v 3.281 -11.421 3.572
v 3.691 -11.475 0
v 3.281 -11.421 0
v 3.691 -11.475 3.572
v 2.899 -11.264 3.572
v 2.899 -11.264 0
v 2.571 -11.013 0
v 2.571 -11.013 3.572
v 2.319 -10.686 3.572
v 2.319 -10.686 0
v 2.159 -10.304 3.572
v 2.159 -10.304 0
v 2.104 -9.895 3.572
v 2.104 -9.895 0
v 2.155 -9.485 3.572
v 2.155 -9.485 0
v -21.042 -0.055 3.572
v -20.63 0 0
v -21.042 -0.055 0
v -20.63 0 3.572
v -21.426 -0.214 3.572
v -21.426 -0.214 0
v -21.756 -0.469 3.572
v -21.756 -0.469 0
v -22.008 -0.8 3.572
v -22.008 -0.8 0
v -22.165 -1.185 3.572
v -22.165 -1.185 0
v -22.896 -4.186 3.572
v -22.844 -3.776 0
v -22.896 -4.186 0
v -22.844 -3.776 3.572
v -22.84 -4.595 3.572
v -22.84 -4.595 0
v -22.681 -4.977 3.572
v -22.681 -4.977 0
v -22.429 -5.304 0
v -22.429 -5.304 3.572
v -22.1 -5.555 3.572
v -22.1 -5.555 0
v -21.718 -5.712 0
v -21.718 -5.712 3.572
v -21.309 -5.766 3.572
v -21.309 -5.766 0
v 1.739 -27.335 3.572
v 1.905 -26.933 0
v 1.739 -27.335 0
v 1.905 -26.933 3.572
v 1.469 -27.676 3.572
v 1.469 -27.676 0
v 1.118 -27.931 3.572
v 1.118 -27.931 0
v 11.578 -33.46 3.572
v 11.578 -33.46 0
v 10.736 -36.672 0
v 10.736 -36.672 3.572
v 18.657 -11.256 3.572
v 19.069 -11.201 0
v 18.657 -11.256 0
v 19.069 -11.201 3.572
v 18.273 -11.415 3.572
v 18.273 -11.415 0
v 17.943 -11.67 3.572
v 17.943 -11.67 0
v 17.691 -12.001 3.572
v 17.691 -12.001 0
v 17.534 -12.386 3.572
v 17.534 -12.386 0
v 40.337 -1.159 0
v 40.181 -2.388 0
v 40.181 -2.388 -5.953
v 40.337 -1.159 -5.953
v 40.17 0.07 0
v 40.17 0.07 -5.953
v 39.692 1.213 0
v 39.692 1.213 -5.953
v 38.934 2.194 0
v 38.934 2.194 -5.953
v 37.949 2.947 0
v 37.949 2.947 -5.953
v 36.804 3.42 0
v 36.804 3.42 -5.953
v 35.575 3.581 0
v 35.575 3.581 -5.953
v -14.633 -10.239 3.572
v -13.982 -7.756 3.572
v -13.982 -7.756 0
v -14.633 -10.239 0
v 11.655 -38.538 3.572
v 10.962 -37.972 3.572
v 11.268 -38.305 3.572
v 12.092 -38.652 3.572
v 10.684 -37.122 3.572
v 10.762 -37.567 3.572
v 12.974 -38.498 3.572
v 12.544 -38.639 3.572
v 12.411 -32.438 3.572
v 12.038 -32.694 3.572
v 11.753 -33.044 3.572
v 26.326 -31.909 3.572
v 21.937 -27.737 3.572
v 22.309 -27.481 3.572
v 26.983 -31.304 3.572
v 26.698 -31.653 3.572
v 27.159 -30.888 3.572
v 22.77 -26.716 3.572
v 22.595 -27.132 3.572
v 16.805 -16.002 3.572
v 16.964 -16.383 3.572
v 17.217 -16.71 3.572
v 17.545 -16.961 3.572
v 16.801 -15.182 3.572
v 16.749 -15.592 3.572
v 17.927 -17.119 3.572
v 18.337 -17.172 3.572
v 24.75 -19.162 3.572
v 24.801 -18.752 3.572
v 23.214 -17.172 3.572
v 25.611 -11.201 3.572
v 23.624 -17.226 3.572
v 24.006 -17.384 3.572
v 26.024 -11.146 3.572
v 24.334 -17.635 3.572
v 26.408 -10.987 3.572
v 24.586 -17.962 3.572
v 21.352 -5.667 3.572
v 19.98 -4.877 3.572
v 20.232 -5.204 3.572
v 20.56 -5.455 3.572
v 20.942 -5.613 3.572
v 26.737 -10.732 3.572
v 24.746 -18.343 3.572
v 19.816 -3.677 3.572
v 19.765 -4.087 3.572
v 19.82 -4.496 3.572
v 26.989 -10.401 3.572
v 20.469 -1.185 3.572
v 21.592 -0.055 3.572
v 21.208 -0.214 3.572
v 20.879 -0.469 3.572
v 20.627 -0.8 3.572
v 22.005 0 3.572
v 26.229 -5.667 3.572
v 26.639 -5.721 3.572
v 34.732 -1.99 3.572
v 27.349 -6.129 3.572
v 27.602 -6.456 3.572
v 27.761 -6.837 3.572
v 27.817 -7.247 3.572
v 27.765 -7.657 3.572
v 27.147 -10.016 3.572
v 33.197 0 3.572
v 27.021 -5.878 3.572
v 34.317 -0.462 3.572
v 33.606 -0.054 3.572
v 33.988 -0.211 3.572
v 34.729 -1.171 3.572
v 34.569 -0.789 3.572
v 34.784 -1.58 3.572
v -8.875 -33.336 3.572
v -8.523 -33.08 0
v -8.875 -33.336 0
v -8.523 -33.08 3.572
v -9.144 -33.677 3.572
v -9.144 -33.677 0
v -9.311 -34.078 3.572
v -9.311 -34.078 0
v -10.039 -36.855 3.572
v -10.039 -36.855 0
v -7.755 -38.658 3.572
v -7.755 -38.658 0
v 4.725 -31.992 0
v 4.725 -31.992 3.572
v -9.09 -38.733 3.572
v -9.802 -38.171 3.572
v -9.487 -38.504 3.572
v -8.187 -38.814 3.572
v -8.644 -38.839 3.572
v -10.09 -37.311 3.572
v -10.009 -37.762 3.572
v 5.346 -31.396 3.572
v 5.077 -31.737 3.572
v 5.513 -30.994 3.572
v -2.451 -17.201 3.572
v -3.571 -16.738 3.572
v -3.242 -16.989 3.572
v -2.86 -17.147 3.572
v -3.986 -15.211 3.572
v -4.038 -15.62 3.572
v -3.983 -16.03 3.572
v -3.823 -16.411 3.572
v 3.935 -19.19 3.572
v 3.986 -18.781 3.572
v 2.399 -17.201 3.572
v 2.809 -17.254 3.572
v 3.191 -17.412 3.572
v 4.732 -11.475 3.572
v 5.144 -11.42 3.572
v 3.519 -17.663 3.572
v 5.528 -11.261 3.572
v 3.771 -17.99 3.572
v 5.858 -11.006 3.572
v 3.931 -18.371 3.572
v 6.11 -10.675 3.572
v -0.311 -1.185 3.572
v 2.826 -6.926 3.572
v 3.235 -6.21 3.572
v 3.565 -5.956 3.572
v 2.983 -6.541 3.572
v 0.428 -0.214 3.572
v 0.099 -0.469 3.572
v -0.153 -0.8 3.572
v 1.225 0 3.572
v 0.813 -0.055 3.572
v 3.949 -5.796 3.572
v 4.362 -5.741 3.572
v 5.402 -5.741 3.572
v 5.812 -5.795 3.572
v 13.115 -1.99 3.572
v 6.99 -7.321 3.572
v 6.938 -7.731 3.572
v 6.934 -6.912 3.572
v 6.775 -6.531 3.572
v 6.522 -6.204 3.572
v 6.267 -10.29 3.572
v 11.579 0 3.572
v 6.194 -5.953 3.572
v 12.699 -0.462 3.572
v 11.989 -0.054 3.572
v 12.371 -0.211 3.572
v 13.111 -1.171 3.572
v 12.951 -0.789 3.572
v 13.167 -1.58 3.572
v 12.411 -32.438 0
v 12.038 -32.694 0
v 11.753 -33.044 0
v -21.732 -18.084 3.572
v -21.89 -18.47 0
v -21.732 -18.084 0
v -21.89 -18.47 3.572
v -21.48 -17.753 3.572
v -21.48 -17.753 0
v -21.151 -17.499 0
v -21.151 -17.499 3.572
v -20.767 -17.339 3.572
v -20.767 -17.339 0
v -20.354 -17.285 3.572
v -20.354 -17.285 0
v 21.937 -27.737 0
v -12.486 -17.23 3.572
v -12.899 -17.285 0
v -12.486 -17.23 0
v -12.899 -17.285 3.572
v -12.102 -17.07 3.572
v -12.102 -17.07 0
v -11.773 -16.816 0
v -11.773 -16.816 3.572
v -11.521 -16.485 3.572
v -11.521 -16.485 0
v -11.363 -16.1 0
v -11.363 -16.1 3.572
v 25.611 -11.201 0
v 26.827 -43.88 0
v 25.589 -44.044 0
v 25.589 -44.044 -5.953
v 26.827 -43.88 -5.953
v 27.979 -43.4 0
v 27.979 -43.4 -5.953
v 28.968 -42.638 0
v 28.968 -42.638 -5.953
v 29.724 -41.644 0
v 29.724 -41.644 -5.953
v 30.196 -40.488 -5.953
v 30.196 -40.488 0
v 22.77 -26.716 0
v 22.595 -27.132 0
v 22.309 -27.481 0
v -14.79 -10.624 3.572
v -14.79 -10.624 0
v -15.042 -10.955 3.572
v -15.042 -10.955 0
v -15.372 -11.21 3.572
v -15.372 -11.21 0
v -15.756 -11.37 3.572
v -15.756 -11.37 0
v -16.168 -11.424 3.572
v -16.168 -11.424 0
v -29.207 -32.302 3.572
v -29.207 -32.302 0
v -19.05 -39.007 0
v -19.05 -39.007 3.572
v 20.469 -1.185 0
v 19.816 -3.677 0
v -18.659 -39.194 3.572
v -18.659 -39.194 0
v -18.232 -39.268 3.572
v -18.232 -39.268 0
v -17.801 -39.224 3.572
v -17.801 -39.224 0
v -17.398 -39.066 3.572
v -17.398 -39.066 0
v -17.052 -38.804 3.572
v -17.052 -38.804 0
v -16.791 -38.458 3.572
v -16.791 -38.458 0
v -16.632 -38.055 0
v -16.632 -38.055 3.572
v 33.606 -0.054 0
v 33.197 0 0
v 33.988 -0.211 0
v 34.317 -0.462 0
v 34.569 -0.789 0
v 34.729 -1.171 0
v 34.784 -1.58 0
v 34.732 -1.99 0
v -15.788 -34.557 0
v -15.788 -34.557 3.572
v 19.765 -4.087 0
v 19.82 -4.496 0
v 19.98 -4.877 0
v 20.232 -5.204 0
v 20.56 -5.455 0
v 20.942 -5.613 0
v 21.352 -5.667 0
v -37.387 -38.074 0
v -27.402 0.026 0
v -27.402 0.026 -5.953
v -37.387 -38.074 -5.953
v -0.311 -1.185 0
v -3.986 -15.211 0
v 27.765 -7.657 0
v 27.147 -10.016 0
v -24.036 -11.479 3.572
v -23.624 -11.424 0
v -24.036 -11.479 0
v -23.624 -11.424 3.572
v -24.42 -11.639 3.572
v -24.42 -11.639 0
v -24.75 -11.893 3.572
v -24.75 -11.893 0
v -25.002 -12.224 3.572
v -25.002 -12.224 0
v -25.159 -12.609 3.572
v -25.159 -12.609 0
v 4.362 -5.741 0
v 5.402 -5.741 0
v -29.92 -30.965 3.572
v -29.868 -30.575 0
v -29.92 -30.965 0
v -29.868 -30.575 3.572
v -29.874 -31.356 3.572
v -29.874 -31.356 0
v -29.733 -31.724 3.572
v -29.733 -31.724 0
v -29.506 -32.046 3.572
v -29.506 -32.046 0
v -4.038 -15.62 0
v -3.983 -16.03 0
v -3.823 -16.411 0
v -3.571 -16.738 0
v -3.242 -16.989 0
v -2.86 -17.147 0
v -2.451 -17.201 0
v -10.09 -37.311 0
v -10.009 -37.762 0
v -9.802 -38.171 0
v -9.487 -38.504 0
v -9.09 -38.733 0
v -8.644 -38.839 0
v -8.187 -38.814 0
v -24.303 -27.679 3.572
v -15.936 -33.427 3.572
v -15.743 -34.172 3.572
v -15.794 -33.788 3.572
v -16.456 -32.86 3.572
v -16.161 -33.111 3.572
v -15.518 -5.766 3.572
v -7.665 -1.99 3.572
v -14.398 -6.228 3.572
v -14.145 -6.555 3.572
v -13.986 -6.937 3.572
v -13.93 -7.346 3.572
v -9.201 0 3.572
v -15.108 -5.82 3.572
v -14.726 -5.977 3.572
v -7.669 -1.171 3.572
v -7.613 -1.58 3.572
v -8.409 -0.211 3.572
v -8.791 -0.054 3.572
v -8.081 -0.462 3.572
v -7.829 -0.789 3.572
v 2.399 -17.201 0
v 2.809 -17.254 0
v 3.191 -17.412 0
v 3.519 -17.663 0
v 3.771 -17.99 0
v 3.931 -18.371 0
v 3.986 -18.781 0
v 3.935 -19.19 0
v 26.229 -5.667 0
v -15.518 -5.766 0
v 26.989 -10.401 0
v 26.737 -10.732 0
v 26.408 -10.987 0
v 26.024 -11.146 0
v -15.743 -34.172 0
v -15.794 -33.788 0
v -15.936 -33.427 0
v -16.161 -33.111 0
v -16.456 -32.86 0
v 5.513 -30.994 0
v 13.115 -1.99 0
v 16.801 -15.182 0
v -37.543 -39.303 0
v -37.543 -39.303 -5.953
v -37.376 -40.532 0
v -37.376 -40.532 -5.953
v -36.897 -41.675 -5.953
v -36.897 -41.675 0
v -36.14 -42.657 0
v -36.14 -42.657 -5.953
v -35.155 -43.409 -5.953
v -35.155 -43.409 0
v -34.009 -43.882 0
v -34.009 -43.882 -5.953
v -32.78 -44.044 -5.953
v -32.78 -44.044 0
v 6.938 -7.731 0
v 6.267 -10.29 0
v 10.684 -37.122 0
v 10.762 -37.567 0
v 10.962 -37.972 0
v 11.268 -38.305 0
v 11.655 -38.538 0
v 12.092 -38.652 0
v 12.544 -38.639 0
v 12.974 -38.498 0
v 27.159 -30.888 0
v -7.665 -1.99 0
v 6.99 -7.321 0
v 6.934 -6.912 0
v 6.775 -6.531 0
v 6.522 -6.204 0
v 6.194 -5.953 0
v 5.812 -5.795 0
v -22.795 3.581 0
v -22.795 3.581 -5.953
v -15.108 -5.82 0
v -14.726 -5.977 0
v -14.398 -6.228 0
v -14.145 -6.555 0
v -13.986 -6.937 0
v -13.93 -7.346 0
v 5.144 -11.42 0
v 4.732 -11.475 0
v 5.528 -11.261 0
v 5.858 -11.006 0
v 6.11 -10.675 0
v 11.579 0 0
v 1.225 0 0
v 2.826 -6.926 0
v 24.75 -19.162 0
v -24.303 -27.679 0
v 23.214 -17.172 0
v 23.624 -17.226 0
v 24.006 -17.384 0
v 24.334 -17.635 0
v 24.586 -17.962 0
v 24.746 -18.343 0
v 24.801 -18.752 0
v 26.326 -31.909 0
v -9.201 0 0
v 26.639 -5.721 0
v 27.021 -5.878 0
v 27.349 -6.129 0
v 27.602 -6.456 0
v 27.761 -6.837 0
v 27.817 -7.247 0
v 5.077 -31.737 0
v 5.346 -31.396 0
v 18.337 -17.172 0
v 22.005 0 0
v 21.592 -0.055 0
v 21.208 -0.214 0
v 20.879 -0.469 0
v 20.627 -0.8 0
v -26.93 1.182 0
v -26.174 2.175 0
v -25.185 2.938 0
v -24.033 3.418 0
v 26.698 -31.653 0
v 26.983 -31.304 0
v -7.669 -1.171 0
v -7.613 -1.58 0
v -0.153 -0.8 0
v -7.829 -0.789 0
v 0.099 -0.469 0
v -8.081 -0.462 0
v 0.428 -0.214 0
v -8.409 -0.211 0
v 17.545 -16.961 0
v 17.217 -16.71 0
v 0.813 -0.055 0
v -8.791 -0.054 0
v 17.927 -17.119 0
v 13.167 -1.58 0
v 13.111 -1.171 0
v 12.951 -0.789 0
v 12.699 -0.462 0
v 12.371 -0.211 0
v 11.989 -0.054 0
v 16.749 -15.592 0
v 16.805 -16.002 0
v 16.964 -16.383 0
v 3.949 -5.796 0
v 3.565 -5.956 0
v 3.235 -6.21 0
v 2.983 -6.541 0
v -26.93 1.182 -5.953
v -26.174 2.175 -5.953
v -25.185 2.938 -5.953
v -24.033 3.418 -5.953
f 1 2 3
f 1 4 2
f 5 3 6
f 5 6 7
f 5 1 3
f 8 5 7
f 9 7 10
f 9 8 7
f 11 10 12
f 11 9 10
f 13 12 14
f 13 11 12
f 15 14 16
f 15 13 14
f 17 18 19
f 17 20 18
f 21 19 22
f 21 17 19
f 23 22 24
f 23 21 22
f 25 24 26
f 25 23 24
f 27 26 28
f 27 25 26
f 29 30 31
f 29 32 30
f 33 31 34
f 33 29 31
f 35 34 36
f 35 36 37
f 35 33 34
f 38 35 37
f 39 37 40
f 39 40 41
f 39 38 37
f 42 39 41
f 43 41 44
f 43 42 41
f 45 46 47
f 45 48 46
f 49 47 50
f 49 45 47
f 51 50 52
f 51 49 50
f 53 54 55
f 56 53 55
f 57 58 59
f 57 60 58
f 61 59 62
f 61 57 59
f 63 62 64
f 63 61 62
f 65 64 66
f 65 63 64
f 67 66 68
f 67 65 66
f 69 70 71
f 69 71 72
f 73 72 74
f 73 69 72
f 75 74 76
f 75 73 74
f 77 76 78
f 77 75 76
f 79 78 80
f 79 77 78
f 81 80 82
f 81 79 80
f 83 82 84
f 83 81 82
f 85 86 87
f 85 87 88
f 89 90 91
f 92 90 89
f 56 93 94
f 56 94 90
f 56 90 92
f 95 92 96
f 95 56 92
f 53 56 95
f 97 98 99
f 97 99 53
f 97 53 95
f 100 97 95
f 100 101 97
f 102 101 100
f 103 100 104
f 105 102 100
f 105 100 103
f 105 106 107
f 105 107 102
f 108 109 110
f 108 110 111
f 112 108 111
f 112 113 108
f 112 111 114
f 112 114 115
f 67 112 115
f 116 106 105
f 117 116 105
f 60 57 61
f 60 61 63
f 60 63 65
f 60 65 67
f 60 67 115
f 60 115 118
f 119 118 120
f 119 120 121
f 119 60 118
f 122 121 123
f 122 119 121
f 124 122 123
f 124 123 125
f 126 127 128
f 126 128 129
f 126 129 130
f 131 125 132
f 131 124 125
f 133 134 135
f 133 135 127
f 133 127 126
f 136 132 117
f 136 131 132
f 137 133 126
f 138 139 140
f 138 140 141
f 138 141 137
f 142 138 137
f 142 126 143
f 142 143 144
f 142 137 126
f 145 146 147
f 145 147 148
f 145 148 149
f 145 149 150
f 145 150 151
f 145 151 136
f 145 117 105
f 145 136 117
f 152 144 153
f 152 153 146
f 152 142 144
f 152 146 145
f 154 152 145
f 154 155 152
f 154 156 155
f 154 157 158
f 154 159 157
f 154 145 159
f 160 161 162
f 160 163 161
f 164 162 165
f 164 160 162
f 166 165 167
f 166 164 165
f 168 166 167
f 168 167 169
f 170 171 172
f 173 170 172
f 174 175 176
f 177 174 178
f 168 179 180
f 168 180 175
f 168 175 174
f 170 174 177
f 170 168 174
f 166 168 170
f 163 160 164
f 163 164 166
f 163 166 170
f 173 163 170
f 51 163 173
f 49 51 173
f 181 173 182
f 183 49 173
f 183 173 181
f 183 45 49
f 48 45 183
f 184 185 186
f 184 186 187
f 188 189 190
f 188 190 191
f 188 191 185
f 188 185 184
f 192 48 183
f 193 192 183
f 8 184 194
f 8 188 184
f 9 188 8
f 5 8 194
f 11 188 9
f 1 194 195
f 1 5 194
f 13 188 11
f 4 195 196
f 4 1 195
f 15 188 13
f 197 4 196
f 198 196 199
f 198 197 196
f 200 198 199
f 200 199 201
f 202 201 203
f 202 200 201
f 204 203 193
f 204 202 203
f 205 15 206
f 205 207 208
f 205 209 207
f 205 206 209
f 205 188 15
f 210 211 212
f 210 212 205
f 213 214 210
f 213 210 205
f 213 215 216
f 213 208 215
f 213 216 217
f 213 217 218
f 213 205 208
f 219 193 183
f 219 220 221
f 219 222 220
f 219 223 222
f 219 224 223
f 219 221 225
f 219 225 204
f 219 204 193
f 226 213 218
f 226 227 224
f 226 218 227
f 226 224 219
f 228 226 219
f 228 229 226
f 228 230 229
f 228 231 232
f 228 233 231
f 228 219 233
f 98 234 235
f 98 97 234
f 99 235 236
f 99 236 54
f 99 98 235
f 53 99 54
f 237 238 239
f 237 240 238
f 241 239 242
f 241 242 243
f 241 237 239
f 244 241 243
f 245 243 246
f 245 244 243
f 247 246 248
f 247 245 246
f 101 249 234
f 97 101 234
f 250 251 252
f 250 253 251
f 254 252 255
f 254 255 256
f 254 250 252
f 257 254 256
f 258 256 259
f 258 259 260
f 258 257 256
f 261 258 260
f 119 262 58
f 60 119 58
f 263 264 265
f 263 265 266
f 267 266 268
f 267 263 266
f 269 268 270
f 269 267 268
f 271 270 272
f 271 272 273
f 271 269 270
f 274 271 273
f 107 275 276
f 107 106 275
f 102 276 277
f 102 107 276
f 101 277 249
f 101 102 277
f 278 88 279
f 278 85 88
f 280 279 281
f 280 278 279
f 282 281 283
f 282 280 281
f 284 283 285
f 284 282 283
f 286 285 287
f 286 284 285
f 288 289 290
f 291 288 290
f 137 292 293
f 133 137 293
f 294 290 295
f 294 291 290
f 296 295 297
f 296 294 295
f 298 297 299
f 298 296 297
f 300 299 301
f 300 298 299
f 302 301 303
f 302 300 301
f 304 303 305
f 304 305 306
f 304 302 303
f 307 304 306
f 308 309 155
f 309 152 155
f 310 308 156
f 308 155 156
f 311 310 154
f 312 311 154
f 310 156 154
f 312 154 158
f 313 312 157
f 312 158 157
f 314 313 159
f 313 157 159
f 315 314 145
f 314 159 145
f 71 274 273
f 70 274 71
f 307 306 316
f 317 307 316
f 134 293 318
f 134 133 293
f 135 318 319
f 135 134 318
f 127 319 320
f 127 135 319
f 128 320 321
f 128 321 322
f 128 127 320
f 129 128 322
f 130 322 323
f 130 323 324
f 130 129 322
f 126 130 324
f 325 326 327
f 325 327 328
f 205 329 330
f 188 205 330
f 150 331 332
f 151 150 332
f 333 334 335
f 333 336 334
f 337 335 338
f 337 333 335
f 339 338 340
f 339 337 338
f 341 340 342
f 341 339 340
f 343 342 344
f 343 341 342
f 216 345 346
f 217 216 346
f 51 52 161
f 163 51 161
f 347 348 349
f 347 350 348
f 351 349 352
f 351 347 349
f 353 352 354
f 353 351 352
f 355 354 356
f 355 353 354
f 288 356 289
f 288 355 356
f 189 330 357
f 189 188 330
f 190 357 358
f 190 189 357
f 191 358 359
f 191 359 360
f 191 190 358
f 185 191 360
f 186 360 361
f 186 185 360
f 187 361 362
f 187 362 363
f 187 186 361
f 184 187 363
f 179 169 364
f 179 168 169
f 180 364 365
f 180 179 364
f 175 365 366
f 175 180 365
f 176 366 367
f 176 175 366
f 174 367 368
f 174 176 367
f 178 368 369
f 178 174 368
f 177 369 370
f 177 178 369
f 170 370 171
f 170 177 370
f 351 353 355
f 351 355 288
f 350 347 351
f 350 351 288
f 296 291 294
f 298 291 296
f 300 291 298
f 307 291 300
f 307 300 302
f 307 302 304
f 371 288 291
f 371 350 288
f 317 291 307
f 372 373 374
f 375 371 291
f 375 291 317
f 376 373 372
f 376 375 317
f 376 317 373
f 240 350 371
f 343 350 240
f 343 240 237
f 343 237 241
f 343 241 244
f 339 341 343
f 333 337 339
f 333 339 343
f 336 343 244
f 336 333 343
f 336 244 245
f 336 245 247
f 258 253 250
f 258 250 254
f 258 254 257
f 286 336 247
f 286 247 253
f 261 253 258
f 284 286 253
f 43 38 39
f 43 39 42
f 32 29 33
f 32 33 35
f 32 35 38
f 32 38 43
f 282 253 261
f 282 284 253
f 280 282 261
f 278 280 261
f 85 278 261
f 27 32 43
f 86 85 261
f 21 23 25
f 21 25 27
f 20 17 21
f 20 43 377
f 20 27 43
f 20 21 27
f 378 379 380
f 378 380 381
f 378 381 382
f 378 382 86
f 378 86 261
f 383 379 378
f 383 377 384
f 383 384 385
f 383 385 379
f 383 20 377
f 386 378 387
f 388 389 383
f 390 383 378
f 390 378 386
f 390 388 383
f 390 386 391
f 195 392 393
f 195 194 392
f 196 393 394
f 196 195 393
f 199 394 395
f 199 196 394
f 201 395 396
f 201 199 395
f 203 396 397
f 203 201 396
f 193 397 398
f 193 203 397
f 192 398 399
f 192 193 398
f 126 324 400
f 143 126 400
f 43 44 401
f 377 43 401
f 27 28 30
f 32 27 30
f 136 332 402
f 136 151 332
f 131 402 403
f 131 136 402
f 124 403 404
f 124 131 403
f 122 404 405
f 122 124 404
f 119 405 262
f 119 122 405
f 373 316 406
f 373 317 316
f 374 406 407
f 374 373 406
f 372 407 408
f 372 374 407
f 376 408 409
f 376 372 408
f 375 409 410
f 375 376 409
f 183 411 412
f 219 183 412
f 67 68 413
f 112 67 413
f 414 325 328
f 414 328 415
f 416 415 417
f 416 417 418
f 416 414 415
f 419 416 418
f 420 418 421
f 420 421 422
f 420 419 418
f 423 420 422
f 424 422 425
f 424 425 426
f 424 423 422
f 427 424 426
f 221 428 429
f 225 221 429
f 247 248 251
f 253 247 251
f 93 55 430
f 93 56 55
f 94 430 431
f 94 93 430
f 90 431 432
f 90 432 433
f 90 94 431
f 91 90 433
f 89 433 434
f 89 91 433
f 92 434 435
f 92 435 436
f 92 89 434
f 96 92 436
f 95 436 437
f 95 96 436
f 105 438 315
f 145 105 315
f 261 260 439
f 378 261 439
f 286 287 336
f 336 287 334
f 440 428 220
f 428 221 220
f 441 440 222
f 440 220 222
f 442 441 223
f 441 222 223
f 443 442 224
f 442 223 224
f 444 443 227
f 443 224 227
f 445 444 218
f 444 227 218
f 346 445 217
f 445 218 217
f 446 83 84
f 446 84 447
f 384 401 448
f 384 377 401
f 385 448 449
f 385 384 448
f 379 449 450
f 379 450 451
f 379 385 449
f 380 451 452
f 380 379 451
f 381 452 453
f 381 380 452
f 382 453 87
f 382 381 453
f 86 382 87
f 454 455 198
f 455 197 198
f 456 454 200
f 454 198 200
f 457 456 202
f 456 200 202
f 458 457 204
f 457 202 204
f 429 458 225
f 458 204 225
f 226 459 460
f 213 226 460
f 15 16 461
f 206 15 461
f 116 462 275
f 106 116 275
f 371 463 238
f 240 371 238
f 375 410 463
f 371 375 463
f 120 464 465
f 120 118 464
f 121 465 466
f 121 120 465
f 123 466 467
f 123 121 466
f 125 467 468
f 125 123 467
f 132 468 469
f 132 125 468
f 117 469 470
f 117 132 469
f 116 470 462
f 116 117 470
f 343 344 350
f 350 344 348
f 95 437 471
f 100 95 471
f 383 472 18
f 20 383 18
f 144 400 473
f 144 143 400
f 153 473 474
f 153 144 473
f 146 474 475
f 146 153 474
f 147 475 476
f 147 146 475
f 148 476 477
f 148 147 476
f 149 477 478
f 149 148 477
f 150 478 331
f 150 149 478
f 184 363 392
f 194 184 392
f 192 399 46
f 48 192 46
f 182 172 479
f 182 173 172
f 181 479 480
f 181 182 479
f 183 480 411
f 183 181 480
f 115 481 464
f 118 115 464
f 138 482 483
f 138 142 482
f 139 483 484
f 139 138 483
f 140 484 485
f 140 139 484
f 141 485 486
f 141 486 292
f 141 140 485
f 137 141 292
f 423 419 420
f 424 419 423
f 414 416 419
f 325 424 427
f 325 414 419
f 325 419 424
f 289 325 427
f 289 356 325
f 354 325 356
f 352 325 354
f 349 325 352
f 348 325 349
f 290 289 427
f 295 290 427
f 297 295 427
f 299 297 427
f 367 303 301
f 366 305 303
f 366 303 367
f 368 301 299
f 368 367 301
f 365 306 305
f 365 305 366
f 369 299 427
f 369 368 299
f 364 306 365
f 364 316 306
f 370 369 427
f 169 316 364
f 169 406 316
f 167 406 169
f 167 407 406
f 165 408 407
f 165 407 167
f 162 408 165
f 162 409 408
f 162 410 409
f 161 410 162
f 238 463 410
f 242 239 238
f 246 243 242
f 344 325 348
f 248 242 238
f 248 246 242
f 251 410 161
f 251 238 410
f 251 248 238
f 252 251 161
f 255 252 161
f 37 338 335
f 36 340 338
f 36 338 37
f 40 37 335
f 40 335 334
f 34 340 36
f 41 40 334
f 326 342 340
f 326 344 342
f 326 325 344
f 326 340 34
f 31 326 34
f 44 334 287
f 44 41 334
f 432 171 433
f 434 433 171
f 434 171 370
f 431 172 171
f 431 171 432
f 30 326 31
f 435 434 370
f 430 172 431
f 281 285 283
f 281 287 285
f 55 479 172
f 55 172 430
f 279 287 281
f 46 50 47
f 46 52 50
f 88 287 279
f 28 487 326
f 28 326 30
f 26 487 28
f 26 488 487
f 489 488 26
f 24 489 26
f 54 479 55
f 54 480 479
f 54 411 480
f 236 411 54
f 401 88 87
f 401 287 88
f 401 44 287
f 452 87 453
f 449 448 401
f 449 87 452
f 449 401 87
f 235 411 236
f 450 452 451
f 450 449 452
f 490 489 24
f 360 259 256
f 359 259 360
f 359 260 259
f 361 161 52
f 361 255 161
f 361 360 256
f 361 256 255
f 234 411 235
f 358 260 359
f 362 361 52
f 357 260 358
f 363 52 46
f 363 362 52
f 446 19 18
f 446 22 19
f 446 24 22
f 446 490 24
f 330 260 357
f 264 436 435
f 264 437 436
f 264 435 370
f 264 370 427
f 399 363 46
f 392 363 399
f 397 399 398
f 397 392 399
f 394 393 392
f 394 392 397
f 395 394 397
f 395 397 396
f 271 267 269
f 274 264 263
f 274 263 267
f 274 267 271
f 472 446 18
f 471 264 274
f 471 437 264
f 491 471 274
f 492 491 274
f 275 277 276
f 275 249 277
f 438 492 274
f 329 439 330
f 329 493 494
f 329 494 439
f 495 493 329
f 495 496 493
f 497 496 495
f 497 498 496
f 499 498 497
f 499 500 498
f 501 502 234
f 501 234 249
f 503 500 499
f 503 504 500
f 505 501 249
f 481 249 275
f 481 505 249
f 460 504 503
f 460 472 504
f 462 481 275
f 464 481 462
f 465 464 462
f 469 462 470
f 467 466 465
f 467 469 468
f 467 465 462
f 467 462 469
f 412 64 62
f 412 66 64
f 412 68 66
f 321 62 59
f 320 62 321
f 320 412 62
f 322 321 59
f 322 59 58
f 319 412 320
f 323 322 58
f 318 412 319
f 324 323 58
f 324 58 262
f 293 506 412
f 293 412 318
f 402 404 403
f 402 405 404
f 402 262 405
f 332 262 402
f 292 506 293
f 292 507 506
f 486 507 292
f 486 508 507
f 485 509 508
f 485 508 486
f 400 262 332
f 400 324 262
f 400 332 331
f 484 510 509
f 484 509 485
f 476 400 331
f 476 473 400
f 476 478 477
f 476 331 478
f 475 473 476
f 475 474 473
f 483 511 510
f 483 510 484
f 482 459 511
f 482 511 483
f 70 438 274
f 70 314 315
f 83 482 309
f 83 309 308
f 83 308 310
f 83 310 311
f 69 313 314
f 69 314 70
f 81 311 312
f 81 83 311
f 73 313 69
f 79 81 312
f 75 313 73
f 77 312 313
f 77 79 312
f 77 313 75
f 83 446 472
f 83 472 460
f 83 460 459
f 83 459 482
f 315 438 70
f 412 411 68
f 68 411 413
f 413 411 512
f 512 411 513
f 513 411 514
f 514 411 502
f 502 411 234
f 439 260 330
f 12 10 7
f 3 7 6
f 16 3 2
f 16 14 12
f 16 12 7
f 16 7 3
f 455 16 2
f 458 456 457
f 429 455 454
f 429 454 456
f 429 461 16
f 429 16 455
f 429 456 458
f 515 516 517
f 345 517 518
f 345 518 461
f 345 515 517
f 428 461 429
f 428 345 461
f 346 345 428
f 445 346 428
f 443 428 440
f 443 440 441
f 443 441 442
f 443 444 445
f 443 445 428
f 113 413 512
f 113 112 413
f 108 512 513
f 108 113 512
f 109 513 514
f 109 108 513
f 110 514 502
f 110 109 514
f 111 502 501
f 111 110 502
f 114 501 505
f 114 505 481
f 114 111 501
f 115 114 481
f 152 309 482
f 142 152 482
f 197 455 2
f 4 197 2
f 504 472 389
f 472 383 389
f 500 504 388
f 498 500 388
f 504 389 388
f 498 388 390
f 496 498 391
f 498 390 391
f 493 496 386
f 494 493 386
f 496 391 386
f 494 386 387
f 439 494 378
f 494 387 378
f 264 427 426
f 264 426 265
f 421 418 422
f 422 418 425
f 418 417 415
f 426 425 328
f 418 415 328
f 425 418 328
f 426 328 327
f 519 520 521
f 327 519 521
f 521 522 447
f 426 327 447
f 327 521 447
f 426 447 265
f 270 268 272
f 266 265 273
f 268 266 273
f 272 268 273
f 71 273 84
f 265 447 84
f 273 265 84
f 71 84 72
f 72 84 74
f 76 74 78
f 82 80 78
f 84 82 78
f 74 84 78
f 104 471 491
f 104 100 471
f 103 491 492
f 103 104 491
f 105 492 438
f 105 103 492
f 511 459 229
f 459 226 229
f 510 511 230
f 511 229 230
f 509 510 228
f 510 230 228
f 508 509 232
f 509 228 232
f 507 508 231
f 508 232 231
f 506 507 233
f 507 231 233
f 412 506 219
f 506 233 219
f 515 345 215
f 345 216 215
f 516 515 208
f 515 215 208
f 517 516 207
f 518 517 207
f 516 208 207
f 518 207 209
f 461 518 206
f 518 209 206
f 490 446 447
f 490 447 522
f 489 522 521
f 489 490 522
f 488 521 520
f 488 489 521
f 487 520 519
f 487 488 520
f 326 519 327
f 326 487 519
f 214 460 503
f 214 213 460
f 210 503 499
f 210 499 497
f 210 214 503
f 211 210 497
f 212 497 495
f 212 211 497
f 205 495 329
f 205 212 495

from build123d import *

# Parameters (mm, degrees)
F1_DEPTH = 4.7625
F2_DEPTH = 7.9375
F3_SCALE = 0.75
F4_R     = 1.5875
F5_R     = 1.5875


with BuildPart() as f1:
    # F0 (on Top) → F1 (new body)
    with BuildSketch(Plane.XY):
        Polygon((47.0052342629, 0), (27.7066360927, 0), (25.7264233393, -7.5556741843), (37.7154810129, -7.5556741843), (35.7815611768, -14.9347137119), (23.7925035033, -14.9347137119), (21.7058496291, -22.8965232611), (33.6949073026, -22.8965232611), (30.1152669523, -36.5549527094), (15.6817594308, -43.6786170032), (13.1379523639, -53.3847343652), (35.9669688721, -42.117462739), align=None)
    extrude(amount=F1_DEPTH)



with BuildPart() as f1b:
    # F0 (on Top) → F1, piece 2 (new body)
    with BuildSketch(Plane.XY):
        Polygon((18.1816360927, 0), (0, 0), (-6.0106108367, -22.9340090122), (5.9414930498, -22.9340090122), (2.3059199107, -36.8058548863), (-12.1803115812, -44.5428210678), (-14.6133578163, -53.8263208316), (7.1163145289, -42.2206979224), align=None)
        Polygon((2.1785185584, -15.2999901774), (4.1821230904, -7.6550626248), (9.9458431257, -7.6550626248), (7.9422385937, -15.2999901774), align=None, mode=Mode.SUBTRACT)
    extrude(amount=F1_DEPTH)


with BuildPart() as f1c:
    # F0 (on Top) → F1, piece 3 (new body)
    with BuildSketch(Plane.XY):
        Polygon((-9.525, 0), (-29.1394729799, 0), (-31.1543771622, -7.6880423522), (-17.9473215339, -7.6880423522), (-19.9244964638, -15.2321254565), (-33.1315520921, -15.2321254565), (-40.2081700043, -42.2335772864), (-22.8844385775, -53.6695948649), (-20.7011714692, -44.6316399521), (-32.4044549927, -36.9058819843), (-28.7720391484, -23.0460830432), (-15.5649835201, -23.0460830432), align=None)
    extrude(amount=F1_DEPTH)


with BuildPart() as f1_1:
    add(f1.part)

    add(f1b.part)  # F2 merges F1b

    add(f1c.part)  # F2 merges F1c
    # F0 (on Top) → F2 (join)
    with BuildSketch(Plane.XY):
        with BuildLine():
            ThreePointArc((-30.3934413824, 4.7752), (-34.2728688515, 3.4523803739), (-36.5359867792, 0.0350559091))
            Line((-36.5359867792, 0.0350559091), (-49.8497964294, -50.7649440909))
            ThreePointArc((-49.8497964294, -50.7649440909), (-48.7344314064, -56.2542274692), (-43.7072510326, -58.7248))
            Line((-43.7072510326, -58.7248), (34.1189475279, -58.7248))
            ThreePointArc((34.1189475279, -58.7248), (37.9983749971, -57.4019803739), (40.2614929247, -53.9846559091))
            Line((40.2614929247, -53.9846559091), (53.5753025749, -3.1846559091))
            ThreePointArc((53.5753025749, -3.1846559091), (52.4599375519, 2.3046274692), (47.4327571781, 4.7752))
            Line((47.4327571781, 4.7752), (-30.3934413824, 4.7752))
        make_face()
        Polygon((-31.1543771622, -7.6880423522), (-29.1394729799, 0), (-9.525, 0), (-15.5649835201, -23.0460830432), (-28.7720391484, -23.0460830432), (-32.4044549927, -36.9058819843), (-20.7011714692, -44.6316399521), (-22.8844385775, -53.6695948649), (-40.2081700043, -42.2335772864), (-33.1315520921, -15.2321254565), (-19.9244964638, -15.2321254565), (-17.9473215339, -7.6880423522), align=None, mode=Mode.SUBTRACT)
        Polygon((-6.0106108367, -22.9340090122), (0, 0), (18.1816360927, 0), (7.1163145289, -42.2206979224), (-14.6133578163, -53.8263208316), (-12.1803115812, -44.5428210678), (2.3059199107, -36.8058548863), (5.9414930498, -22.9340090122), align=None, mode=Mode.SUBTRACT)
        Polygon((25.7264233393, -7.5556741843), (27.7066360927, 0), (47.0052342629, 0), (35.9669688721, -42.117462739), (13.1379523639, -53.3847343652), (15.6817594308, -43.6786170032), (30.1152669523, -36.5549527094), (33.6949073026, -22.8965232611), (21.7058496291, -22.8965232611), (23.7925035033, -14.9347137119), (35.7815611768, -14.9347137119), (37.7154810129, -7.5556741843), align=None, mode=Mode.SUBTRACT)
        Polygon((18.1816360927, 0), (0, 0), (-6.0106108367, -22.9340090122), (5.9414930498, -22.9340090122), (2.3059199107, -36.8058548863), (-12.1803115812, -44.5428210678), (-14.6133578163, -53.8263208316), (7.1163145289, -42.2206979224), align=None)
        Polygon((2.1785185584, -15.2999901774), (4.1821230904, -7.6550626248), (9.9458431257, -7.6550626248), (7.9422385937, -15.2999901774), align=None, mode=Mode.SUBTRACT)
        Polygon((47.0052342629, 0), (27.7066360927, 0), (25.7264233393, -7.5556741843), (37.7154810129, -7.5556741843), (35.7815611768, -14.9347137119), (23.7925035033, -14.9347137119), (21.7058496291, -22.8965232611), (33.6949073026, -22.8965232611), (30.1152669523, -36.5549527094), (15.6817594308, -43.6786170032), (13.1379523639, -53.3847343652), (35.9669688721, -42.117462739), align=None)
        Polygon((-9.525, 0), (-29.1394729799, 0), (-31.1543771622, -7.6880423522), (-17.9473215339, -7.6880423522), (-19.9244964638, -15.2321254565), (-33.1315520921, -15.2321254565), (-40.2081700043, -42.2335772864), (-22.8844385775, -53.6695948649), (-20.7011714692, -44.6316399521), (-32.4044549927, -36.9058819843), (-28.7720391484, -23.0460830432), (-15.5649835201, -23.0460830432), align=None)
        Polygon((9.9458431257, -7.6550626248), (4.1821230904, -7.6550626248), (2.1785185584, -15.2999901774), (7.9422385937, -15.2999901774), align=None)
    extrude(amount=-F2_DEPTH)


with BuildPart() as f1_2:
    # F3: moved
    add(f1_1.part.scale(F3_SCALE))

    # F4
    f4_edges = [f1_2.edges().sort_by_distance(p)[0] for p in [
        (-21.854605, 0, 1.785938),
        (-23.365783, -5.766032, 1.785938),
        (-13.460491, -5.766032, 1.785938),
        (-14.943372, -11.424094, 1.785938),
        (-24.848664, -11.424094, 1.785938),
        (-30.156128, -31.675183, 1.785938),
        (-17.163329, -40.252196, 1.785938),
        (-15.525879, -33.47373, 1.785938),
        (-21.579029, -17.284562, 1.785938),
        (-11.673738, -17.284562, 1.785938),
        (-4.507958, -17.200507, 1.785938),
        (4.45612, -17.200507, 1.785938),
        (1.72944, -27.604391, 1.785938),
        (-9.135234, -33.407116, 1.785938),
        (-10.960018, -40.369741, 1.785938),
        (5.337236, -31.665523, 1.785938),
        (13.636227, 0, 1.785938),
        (0, 0, 1.785938),
        (3.136592, -5.741297, 1.785938),
        (1.633889, -11.474993, 1.785938),
        (7.459382, -5.741297, 1.785938),
        (5.956679, -11.474993, 1.785938),
        (-7.14375, 0, 1.785938),
    ]]
    fillet(f4_edges, radius=F4_R)

    # F5
    f5_edges = [f1_2.edges().sort_by_distance(p)[0] for p in [
        (28.286611, -5.666756, 1.785938),
        (19.294818, -5.666756, 1.785938),
        (20.779977, 0, 1.785938),
        (17.844378, -11.201035, 1.785938),
        (16.279387, -17.172392, 1.785938),
        (25.27118, -17.172392, 1.785938),
        (11.76132, -32.758963, 1.785938),
        (9.853464, -40.038551, 1.785938),
        (26.975227, -31.588097, 1.785938),
        (22.58645, -27.416215, 1.785938),
        (26.836171, -11.201035, 1.785938),
        (35.253926, 0, 1.785938),
    ]]
    fillet(f5_edges, radius=F5_R)


solid = f1_2.part
